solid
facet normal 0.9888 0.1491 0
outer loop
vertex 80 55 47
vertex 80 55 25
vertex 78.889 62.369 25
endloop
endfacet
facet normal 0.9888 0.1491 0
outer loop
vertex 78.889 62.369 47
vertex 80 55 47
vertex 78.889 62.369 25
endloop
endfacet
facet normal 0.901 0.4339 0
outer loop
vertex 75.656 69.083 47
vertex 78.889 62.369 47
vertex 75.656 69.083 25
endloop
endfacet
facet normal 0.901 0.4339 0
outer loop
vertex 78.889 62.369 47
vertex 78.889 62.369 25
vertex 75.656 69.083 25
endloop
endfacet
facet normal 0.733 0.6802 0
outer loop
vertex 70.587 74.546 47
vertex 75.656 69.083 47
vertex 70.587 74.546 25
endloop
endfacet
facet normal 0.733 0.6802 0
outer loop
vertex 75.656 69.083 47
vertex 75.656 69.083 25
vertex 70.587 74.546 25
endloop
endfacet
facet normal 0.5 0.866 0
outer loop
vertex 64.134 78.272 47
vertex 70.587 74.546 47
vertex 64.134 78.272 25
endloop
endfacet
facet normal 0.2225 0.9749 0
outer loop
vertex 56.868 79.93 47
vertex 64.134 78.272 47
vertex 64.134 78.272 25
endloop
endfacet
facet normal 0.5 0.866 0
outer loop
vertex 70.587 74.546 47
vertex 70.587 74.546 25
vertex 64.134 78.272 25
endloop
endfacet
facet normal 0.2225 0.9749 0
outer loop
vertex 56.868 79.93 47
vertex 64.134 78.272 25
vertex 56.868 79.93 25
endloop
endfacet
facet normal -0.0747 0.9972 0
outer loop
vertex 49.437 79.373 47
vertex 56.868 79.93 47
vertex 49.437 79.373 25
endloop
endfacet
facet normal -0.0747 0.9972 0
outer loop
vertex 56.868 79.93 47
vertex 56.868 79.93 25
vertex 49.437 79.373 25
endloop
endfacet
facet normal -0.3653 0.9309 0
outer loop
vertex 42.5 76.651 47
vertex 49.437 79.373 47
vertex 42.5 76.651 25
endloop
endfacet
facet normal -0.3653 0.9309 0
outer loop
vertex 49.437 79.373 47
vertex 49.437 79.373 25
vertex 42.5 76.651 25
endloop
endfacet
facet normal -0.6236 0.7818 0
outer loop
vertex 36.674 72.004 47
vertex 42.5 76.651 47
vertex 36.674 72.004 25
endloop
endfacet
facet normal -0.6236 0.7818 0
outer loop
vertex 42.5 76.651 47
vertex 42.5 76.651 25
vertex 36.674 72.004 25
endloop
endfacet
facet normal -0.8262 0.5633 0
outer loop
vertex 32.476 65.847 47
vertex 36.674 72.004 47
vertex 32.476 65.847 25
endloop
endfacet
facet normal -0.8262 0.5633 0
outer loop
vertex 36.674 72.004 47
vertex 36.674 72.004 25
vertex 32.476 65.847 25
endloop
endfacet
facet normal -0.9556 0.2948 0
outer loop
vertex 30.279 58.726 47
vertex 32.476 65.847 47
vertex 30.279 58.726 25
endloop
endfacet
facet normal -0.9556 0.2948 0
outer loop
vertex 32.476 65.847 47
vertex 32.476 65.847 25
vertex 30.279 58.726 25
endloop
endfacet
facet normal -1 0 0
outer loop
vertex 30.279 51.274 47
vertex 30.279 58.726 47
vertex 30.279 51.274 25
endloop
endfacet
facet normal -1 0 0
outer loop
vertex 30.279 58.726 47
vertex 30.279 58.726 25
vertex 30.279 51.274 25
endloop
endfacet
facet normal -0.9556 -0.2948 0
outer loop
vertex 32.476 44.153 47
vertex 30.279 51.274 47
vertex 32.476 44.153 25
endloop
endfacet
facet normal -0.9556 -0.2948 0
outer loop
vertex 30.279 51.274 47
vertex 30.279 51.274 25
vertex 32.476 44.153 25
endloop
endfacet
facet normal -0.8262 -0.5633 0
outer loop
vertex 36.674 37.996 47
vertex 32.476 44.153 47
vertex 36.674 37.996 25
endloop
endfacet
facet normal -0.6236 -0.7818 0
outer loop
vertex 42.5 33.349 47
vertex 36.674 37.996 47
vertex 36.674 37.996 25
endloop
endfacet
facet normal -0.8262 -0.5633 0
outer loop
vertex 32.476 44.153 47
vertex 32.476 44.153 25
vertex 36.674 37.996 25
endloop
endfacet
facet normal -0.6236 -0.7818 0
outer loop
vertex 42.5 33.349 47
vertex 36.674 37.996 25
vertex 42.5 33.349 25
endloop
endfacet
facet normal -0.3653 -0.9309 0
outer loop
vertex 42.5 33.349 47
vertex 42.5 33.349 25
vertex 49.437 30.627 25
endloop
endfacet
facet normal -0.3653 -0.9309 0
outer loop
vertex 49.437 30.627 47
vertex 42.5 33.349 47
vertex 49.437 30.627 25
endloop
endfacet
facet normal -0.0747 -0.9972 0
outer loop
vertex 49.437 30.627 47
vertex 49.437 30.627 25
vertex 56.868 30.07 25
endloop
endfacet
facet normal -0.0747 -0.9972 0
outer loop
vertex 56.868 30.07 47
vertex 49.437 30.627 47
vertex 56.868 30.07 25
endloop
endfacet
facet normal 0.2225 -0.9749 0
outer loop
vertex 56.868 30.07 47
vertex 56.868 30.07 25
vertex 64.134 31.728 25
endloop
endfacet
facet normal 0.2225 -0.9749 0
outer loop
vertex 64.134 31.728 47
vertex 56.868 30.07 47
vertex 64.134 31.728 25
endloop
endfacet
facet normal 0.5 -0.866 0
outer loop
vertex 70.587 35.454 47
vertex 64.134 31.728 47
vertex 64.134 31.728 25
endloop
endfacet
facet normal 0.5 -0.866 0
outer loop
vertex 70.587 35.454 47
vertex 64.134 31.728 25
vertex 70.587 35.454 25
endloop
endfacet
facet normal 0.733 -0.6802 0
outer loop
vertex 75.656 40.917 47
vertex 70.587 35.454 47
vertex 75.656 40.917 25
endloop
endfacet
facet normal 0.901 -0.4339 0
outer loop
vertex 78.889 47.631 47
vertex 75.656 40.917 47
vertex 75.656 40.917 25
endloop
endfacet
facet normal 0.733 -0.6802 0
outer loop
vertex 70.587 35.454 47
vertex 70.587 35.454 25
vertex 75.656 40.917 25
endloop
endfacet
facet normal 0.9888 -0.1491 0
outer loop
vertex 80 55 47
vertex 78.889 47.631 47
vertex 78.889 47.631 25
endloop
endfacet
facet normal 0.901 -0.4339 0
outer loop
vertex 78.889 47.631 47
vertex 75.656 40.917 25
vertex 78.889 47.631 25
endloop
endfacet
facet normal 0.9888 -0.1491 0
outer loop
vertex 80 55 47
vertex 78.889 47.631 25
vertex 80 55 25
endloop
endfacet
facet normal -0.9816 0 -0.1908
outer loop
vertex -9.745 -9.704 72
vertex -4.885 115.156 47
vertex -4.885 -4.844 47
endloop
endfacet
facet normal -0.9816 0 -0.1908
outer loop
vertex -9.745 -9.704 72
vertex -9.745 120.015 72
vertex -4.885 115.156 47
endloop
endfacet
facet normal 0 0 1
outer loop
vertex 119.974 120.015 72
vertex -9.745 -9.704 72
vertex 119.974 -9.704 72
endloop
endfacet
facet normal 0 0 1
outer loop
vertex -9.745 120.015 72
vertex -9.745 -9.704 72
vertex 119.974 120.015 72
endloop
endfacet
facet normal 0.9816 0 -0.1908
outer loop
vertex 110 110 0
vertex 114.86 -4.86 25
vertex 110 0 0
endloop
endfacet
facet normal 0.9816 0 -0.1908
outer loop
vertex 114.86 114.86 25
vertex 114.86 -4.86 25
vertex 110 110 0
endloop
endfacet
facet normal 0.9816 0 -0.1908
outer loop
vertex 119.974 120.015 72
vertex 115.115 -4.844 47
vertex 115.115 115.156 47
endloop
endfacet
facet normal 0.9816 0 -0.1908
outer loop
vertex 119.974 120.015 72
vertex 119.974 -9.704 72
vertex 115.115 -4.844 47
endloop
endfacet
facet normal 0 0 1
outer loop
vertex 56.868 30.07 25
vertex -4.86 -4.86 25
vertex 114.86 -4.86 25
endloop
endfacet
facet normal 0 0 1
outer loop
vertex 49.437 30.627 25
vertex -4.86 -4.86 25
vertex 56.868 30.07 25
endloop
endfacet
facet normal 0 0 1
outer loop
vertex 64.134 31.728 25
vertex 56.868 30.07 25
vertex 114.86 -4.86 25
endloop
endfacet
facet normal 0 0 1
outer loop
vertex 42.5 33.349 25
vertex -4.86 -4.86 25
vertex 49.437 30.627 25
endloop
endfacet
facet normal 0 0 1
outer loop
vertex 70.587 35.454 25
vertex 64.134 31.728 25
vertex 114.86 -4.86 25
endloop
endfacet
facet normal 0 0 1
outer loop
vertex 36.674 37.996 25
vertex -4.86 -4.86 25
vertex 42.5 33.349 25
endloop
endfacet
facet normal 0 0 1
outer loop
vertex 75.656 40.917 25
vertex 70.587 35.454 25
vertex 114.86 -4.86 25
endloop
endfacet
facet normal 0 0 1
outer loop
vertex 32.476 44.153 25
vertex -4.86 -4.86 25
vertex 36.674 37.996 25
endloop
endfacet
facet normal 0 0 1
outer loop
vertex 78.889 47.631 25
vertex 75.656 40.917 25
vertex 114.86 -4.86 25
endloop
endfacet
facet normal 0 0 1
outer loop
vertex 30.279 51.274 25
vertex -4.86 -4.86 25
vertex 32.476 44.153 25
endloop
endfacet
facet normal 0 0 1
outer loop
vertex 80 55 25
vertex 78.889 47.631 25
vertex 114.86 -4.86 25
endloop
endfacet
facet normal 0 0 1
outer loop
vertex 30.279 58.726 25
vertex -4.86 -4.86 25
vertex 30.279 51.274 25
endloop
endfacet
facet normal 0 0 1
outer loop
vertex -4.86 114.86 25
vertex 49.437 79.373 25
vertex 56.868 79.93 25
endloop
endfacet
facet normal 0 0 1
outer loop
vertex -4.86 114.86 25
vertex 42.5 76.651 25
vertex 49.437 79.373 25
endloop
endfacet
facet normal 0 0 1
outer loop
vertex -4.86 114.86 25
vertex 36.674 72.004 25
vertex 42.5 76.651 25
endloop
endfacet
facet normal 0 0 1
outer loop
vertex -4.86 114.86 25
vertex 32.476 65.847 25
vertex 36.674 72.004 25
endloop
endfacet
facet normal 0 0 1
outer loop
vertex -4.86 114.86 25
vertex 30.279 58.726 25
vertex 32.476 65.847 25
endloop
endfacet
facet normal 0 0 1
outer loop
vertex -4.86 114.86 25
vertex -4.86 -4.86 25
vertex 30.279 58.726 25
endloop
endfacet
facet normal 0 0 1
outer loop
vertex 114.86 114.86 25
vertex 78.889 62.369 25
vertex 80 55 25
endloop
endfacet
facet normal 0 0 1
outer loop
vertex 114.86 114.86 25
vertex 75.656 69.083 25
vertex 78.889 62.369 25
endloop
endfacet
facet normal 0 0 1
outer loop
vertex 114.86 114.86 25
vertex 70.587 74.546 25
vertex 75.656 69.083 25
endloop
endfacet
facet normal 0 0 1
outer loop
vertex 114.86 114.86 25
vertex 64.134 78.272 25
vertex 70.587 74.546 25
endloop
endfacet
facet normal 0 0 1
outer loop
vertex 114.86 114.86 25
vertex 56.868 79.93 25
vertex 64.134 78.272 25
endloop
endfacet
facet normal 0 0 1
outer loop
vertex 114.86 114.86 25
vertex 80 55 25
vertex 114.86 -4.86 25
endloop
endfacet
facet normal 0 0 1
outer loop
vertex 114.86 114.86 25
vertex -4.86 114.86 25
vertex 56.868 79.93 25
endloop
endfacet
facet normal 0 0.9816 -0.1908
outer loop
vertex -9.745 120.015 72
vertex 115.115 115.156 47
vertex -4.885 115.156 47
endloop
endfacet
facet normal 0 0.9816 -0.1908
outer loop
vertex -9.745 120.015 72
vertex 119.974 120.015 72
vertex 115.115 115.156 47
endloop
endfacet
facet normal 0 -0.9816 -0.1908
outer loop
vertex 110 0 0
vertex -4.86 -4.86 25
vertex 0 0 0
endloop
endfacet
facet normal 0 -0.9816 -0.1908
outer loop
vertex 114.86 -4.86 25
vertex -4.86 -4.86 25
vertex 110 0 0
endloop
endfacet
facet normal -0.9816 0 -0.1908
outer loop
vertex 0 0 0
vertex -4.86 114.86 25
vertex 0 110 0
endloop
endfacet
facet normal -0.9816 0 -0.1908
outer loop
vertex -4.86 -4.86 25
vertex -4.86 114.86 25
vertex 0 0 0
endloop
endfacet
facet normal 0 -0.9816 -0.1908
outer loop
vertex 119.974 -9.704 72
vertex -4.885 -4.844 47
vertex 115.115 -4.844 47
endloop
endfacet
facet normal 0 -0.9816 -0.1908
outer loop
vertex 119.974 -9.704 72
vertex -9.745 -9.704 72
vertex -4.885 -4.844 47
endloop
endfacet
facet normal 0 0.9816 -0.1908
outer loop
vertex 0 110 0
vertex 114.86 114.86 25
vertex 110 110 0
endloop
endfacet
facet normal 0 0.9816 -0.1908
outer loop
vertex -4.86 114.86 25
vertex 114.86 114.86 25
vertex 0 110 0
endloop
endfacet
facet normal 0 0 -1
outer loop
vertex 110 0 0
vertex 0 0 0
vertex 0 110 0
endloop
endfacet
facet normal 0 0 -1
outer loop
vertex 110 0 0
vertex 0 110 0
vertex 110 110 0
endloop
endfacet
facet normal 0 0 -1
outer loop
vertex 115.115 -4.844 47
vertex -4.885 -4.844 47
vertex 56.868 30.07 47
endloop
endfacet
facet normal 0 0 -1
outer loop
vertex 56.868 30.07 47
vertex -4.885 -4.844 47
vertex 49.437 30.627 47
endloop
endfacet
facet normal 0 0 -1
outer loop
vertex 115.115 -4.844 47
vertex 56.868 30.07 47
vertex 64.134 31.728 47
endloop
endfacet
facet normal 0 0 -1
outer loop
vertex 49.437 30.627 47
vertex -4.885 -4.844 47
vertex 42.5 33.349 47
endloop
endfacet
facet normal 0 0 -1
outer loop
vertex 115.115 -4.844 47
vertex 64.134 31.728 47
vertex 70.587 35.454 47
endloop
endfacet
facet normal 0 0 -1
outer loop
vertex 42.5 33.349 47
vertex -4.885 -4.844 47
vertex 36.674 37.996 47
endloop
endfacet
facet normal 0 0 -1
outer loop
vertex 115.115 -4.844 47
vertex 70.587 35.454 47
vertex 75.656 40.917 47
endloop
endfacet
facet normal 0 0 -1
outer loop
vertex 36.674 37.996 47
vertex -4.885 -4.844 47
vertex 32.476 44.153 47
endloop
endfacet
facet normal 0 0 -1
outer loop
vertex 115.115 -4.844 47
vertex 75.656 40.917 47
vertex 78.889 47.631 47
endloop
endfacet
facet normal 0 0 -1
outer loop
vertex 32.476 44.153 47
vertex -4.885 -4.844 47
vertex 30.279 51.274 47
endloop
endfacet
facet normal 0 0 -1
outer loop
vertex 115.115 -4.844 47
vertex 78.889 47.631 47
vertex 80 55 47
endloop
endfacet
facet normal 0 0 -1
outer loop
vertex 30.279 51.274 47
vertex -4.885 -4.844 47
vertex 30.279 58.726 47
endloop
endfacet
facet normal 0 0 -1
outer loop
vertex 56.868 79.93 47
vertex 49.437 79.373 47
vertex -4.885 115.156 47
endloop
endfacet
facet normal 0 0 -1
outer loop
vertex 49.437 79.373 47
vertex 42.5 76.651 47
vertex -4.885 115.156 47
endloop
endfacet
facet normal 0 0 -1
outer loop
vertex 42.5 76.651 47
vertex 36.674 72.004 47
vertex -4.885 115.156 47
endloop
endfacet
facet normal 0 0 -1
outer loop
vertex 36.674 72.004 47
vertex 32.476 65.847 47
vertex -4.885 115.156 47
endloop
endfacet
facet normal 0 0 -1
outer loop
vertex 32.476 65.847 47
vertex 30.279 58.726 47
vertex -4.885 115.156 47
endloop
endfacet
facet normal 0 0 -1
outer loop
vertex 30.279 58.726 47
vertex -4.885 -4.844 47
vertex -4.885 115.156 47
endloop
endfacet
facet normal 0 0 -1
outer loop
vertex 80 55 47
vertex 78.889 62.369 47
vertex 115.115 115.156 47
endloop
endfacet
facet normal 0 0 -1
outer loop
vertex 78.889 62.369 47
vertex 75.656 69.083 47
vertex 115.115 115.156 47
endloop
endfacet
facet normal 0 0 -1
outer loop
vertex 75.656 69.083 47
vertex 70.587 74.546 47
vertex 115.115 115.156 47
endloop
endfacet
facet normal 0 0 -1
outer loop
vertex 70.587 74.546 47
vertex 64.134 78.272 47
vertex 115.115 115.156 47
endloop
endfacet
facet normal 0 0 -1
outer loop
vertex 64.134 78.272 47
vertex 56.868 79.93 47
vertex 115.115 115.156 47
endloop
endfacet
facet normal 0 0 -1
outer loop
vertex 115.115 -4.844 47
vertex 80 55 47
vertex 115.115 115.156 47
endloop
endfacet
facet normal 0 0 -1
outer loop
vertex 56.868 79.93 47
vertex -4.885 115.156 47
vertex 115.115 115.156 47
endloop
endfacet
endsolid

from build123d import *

# Parameters (mm, degrees)
F0_W     = 110
F0_H     = 110
F1_DEPTH = 25
F1_TAPER = -11
F2_R     = 25
F3_DEPTH = 22
F4_W     = 120
F4_H     = 120
F4_R     = 25
F5_DEPTH = 25
F5_TAPER = -11


with BuildPart() as f1:
    # F0 (on Top) → F1 (new body)
    with BuildSketch(Plane.XY):
        with Locations((55, 55)):
            Rectangle(F0_W, F0_H)
    extrude(amount=F1_DEPTH, taper=F1_TAPER)

    # F2 (on face) → F3 (join)
    with BuildSketch(Plane.XY.offset(25)):
        with Locations((55, 55)):
            Circle(F2_R)
    extrude(amount=F3_DEPTH)

    # F4 (on face) → F5 (join)
    with BuildSketch(Plane.XY.offset(47)):
        with Locations((55.1147708297, 55.155566372)):
            Rectangle(F4_W, F4_H)
        with Locations((55, 55)):
            Circle(F4_R, mode=Mode.SUBTRACT)
        with Locations((55, 55)):
            Circle(F4_R)
    extrude(amount=F5_DEPTH, taper=F5_TAPER)


solid = f1.part
